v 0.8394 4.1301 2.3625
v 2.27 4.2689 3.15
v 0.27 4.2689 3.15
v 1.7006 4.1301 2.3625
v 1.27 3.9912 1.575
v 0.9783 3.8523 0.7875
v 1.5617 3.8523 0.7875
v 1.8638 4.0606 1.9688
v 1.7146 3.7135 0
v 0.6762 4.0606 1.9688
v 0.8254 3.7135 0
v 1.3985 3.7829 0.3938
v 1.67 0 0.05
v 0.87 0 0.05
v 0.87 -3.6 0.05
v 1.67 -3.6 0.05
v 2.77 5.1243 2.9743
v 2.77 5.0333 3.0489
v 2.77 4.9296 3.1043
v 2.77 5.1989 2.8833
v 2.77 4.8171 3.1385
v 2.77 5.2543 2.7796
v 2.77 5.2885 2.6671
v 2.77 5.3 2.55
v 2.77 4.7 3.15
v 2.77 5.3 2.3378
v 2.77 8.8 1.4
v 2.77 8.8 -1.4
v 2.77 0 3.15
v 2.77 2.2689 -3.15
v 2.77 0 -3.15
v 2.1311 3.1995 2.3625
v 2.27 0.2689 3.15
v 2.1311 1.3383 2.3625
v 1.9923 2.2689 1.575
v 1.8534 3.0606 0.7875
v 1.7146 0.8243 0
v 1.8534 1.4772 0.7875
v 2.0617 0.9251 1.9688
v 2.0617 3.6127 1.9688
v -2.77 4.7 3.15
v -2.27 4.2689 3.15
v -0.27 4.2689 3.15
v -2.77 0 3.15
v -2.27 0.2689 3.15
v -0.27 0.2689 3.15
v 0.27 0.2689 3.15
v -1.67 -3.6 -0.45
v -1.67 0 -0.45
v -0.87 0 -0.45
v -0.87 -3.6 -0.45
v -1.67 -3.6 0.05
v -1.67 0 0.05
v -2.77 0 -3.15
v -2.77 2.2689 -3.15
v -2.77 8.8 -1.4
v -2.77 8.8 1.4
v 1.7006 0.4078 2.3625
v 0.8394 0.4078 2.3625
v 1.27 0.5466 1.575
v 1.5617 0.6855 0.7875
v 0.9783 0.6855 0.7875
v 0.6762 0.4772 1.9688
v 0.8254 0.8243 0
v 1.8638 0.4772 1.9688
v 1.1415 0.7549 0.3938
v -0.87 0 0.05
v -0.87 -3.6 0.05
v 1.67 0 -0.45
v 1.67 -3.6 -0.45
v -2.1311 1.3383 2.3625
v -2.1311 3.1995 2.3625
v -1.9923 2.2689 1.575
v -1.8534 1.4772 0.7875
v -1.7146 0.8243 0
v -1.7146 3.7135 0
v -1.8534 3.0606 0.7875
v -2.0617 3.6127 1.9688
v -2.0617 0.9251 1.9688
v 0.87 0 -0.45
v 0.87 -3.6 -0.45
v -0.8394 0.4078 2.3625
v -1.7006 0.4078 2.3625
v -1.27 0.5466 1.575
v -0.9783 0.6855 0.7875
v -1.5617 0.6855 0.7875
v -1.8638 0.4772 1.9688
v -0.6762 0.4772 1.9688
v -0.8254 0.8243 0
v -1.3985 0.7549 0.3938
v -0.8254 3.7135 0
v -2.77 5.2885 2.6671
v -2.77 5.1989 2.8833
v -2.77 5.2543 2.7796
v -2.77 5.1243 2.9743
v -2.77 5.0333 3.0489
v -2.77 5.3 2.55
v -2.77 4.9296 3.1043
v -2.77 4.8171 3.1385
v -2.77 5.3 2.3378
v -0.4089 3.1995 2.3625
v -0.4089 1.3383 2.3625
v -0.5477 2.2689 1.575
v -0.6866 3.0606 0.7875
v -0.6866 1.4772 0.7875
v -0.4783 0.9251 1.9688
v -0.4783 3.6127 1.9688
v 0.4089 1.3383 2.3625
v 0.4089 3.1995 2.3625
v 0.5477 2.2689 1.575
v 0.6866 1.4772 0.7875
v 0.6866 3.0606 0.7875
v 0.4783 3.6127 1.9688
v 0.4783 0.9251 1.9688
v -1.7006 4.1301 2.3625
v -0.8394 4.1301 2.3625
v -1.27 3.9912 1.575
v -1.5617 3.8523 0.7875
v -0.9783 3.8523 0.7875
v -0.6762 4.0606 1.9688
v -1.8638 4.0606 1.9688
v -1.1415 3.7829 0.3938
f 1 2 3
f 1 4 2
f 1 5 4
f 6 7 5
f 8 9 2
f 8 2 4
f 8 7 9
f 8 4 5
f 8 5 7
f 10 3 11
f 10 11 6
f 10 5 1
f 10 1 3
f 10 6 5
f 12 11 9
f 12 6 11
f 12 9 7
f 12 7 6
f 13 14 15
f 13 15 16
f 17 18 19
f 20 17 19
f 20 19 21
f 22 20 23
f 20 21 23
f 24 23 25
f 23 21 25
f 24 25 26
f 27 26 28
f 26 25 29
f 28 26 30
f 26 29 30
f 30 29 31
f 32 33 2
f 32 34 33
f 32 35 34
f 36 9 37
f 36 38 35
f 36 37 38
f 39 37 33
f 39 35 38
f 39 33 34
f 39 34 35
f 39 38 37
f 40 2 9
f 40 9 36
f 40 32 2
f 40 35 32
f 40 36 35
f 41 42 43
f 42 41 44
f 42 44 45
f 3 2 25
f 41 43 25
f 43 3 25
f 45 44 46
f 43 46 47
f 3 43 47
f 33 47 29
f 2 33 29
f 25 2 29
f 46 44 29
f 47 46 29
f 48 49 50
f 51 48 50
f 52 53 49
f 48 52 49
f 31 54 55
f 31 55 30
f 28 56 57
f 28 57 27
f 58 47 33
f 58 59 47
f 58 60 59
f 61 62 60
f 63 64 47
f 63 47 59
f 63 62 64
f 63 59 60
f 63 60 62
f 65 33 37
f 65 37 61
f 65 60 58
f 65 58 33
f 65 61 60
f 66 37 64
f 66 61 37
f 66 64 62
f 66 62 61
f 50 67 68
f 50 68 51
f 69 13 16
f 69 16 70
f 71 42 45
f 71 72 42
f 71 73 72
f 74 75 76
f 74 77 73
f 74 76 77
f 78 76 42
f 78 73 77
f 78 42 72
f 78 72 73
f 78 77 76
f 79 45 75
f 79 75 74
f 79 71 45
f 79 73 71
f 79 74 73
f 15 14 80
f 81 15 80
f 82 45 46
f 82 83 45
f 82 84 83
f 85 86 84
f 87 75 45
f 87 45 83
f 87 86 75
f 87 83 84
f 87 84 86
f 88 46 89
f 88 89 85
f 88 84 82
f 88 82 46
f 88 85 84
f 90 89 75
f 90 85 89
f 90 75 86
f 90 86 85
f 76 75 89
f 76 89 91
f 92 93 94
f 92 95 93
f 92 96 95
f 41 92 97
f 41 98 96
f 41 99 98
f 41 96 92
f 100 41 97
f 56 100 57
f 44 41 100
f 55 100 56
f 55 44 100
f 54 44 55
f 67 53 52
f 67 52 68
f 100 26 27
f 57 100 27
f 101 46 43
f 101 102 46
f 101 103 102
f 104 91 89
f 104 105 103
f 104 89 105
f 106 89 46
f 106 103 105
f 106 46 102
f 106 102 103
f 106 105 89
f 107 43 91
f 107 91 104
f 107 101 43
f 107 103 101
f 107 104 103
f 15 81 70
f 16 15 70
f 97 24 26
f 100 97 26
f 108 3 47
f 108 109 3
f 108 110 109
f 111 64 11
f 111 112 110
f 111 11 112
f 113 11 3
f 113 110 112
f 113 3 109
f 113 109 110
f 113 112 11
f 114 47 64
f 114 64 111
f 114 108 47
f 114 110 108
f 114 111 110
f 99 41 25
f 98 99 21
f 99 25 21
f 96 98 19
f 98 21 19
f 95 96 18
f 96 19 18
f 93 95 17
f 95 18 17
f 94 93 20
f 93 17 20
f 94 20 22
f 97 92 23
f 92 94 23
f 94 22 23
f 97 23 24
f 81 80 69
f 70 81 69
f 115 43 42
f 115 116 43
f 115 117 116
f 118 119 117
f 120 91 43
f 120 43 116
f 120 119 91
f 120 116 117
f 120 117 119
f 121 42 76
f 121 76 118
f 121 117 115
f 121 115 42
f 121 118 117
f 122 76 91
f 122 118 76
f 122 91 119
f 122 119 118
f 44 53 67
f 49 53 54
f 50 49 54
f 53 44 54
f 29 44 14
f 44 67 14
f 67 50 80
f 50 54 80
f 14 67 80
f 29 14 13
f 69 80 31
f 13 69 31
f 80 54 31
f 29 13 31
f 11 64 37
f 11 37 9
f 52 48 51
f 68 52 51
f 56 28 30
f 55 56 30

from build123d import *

# Parameters (mm, degrees)
SKETCH1_W           = 5.54
SKETCH1_H           = 6.3
BOSS_EXTRUDE1_DEPTH = 8.8
SKETCH2_W           = 0.8
SKETCH2_H           = 0.5
BOSS_EXTRUDE2_DEPTH = 3.6
CUT_EXTRUDE1_REACH  = 7.54
SKETCH4_W           = 2
SKETCH4_H           = 4
CUT_EXTRUDE2_DEPTH  = 3.15
CUT_EXTRUDE2_TAPER  = 10


with BuildPart() as part:
    # Sketch1 → Boss-Extrude1 (new body)
    with BuildSketch(Plane(origin=(0, 0, 0), x_dir=(1, 0, 0), z_dir=(0, 1, 0))):
        Rectangle(SKETCH1_W, SKETCH1_H)
    extrude(amount=BOSS_EXTRUDE1_DEPTH)

    # Sketch2 → Boss-Extrude2 (add)
    with BuildSketch(Plane(origin=(0, 0, 0), x_dir=(1, 0, 0), z_dir=(0, 1, 0))):
        with Locations((1.27, 0.2)):
            Rectangle(SKETCH2_W, SKETCH2_H)
        with Locations((-1.27, 0.2)):
            Rectangle(SKETCH2_W, SKETCH2_H)
    extrude(amount=-BOSS_EXTRUDE2_DEPTH)

    # Sketch3 → Cut-Extrude1 (cut, up to next)
    with BuildSketch(Plane(origin=(2.77, 0, 0), x_dir=(0, 0, -1), z_dir=(1, 0, 0)), mode=Mode.PRIVATE) as cut_extrude1_sk1:
        with BuildLine():
            ThreePointArc((-3.15, 4.7), (-2.974264069, 5.124264069), (-2.55, 5.3))
            Line((-2.55, 5.3), (-2.337822174, 5.3))
            Line((-2.337822174, 5.3), (-1.4, 8.8))
            Line((-1.4, 8.8), (-3.15, 8.8))
            Line((-3.15, 8.8), (-3.15, 4.7))
        make_face()
    cut_extrude1_tool1 = extrude(cut_extrude1_sk1.sketch, amount=-CUT_EXTRUDE1_REACH, mode=Mode.PRIVATE) & part.part
    add(cut_extrude1_tool1.solids().sort_by_distance((2.77, 7.227986, 2.489914))[0], mode=Mode.SUBTRACT)
    # Sketch3 → Cut-Extrude1 (cut, up to next)
    with BuildSketch(Plane(origin=(2.77, 0, 0), x_dir=(0, 0, -1), z_dir=(1, 0, 0)), mode=Mode.PRIVATE) as cut_extrude1_sk2:
        Polygon((3.15, 8.8), (1.4, 8.8), (3.15, 2.268911087), align=None)
    cut_extrude1_tool2 = extrude(cut_extrude1_sk2.sketch, amount=-CUT_EXTRUDE1_REACH, mode=Mode.PRIVATE) & part.part
    add(cut_extrude1_tool2.solids().sort_by_distance((2.77, 6.62297, -2.566667))[0], mode=Mode.SUBTRACT)

    # Sketch4 → Cut-Extrude2 (cut)
    with BuildSketch(Plane.XY.offset(3.15)):
        with Locations((-1.27, 2.268911087)):
            Rectangle(SKETCH4_W, SKETCH4_H)
        with Locations((1.27, 2.268911087)):
            Rectangle(SKETCH4_W, SKETCH4_H)
    extrude(amount=-CUT_EXTRUDE2_DEPTH, taper=CUT_EXTRUDE2_TAPER, mode=Mode.SUBTRACT)


solid = part.part
